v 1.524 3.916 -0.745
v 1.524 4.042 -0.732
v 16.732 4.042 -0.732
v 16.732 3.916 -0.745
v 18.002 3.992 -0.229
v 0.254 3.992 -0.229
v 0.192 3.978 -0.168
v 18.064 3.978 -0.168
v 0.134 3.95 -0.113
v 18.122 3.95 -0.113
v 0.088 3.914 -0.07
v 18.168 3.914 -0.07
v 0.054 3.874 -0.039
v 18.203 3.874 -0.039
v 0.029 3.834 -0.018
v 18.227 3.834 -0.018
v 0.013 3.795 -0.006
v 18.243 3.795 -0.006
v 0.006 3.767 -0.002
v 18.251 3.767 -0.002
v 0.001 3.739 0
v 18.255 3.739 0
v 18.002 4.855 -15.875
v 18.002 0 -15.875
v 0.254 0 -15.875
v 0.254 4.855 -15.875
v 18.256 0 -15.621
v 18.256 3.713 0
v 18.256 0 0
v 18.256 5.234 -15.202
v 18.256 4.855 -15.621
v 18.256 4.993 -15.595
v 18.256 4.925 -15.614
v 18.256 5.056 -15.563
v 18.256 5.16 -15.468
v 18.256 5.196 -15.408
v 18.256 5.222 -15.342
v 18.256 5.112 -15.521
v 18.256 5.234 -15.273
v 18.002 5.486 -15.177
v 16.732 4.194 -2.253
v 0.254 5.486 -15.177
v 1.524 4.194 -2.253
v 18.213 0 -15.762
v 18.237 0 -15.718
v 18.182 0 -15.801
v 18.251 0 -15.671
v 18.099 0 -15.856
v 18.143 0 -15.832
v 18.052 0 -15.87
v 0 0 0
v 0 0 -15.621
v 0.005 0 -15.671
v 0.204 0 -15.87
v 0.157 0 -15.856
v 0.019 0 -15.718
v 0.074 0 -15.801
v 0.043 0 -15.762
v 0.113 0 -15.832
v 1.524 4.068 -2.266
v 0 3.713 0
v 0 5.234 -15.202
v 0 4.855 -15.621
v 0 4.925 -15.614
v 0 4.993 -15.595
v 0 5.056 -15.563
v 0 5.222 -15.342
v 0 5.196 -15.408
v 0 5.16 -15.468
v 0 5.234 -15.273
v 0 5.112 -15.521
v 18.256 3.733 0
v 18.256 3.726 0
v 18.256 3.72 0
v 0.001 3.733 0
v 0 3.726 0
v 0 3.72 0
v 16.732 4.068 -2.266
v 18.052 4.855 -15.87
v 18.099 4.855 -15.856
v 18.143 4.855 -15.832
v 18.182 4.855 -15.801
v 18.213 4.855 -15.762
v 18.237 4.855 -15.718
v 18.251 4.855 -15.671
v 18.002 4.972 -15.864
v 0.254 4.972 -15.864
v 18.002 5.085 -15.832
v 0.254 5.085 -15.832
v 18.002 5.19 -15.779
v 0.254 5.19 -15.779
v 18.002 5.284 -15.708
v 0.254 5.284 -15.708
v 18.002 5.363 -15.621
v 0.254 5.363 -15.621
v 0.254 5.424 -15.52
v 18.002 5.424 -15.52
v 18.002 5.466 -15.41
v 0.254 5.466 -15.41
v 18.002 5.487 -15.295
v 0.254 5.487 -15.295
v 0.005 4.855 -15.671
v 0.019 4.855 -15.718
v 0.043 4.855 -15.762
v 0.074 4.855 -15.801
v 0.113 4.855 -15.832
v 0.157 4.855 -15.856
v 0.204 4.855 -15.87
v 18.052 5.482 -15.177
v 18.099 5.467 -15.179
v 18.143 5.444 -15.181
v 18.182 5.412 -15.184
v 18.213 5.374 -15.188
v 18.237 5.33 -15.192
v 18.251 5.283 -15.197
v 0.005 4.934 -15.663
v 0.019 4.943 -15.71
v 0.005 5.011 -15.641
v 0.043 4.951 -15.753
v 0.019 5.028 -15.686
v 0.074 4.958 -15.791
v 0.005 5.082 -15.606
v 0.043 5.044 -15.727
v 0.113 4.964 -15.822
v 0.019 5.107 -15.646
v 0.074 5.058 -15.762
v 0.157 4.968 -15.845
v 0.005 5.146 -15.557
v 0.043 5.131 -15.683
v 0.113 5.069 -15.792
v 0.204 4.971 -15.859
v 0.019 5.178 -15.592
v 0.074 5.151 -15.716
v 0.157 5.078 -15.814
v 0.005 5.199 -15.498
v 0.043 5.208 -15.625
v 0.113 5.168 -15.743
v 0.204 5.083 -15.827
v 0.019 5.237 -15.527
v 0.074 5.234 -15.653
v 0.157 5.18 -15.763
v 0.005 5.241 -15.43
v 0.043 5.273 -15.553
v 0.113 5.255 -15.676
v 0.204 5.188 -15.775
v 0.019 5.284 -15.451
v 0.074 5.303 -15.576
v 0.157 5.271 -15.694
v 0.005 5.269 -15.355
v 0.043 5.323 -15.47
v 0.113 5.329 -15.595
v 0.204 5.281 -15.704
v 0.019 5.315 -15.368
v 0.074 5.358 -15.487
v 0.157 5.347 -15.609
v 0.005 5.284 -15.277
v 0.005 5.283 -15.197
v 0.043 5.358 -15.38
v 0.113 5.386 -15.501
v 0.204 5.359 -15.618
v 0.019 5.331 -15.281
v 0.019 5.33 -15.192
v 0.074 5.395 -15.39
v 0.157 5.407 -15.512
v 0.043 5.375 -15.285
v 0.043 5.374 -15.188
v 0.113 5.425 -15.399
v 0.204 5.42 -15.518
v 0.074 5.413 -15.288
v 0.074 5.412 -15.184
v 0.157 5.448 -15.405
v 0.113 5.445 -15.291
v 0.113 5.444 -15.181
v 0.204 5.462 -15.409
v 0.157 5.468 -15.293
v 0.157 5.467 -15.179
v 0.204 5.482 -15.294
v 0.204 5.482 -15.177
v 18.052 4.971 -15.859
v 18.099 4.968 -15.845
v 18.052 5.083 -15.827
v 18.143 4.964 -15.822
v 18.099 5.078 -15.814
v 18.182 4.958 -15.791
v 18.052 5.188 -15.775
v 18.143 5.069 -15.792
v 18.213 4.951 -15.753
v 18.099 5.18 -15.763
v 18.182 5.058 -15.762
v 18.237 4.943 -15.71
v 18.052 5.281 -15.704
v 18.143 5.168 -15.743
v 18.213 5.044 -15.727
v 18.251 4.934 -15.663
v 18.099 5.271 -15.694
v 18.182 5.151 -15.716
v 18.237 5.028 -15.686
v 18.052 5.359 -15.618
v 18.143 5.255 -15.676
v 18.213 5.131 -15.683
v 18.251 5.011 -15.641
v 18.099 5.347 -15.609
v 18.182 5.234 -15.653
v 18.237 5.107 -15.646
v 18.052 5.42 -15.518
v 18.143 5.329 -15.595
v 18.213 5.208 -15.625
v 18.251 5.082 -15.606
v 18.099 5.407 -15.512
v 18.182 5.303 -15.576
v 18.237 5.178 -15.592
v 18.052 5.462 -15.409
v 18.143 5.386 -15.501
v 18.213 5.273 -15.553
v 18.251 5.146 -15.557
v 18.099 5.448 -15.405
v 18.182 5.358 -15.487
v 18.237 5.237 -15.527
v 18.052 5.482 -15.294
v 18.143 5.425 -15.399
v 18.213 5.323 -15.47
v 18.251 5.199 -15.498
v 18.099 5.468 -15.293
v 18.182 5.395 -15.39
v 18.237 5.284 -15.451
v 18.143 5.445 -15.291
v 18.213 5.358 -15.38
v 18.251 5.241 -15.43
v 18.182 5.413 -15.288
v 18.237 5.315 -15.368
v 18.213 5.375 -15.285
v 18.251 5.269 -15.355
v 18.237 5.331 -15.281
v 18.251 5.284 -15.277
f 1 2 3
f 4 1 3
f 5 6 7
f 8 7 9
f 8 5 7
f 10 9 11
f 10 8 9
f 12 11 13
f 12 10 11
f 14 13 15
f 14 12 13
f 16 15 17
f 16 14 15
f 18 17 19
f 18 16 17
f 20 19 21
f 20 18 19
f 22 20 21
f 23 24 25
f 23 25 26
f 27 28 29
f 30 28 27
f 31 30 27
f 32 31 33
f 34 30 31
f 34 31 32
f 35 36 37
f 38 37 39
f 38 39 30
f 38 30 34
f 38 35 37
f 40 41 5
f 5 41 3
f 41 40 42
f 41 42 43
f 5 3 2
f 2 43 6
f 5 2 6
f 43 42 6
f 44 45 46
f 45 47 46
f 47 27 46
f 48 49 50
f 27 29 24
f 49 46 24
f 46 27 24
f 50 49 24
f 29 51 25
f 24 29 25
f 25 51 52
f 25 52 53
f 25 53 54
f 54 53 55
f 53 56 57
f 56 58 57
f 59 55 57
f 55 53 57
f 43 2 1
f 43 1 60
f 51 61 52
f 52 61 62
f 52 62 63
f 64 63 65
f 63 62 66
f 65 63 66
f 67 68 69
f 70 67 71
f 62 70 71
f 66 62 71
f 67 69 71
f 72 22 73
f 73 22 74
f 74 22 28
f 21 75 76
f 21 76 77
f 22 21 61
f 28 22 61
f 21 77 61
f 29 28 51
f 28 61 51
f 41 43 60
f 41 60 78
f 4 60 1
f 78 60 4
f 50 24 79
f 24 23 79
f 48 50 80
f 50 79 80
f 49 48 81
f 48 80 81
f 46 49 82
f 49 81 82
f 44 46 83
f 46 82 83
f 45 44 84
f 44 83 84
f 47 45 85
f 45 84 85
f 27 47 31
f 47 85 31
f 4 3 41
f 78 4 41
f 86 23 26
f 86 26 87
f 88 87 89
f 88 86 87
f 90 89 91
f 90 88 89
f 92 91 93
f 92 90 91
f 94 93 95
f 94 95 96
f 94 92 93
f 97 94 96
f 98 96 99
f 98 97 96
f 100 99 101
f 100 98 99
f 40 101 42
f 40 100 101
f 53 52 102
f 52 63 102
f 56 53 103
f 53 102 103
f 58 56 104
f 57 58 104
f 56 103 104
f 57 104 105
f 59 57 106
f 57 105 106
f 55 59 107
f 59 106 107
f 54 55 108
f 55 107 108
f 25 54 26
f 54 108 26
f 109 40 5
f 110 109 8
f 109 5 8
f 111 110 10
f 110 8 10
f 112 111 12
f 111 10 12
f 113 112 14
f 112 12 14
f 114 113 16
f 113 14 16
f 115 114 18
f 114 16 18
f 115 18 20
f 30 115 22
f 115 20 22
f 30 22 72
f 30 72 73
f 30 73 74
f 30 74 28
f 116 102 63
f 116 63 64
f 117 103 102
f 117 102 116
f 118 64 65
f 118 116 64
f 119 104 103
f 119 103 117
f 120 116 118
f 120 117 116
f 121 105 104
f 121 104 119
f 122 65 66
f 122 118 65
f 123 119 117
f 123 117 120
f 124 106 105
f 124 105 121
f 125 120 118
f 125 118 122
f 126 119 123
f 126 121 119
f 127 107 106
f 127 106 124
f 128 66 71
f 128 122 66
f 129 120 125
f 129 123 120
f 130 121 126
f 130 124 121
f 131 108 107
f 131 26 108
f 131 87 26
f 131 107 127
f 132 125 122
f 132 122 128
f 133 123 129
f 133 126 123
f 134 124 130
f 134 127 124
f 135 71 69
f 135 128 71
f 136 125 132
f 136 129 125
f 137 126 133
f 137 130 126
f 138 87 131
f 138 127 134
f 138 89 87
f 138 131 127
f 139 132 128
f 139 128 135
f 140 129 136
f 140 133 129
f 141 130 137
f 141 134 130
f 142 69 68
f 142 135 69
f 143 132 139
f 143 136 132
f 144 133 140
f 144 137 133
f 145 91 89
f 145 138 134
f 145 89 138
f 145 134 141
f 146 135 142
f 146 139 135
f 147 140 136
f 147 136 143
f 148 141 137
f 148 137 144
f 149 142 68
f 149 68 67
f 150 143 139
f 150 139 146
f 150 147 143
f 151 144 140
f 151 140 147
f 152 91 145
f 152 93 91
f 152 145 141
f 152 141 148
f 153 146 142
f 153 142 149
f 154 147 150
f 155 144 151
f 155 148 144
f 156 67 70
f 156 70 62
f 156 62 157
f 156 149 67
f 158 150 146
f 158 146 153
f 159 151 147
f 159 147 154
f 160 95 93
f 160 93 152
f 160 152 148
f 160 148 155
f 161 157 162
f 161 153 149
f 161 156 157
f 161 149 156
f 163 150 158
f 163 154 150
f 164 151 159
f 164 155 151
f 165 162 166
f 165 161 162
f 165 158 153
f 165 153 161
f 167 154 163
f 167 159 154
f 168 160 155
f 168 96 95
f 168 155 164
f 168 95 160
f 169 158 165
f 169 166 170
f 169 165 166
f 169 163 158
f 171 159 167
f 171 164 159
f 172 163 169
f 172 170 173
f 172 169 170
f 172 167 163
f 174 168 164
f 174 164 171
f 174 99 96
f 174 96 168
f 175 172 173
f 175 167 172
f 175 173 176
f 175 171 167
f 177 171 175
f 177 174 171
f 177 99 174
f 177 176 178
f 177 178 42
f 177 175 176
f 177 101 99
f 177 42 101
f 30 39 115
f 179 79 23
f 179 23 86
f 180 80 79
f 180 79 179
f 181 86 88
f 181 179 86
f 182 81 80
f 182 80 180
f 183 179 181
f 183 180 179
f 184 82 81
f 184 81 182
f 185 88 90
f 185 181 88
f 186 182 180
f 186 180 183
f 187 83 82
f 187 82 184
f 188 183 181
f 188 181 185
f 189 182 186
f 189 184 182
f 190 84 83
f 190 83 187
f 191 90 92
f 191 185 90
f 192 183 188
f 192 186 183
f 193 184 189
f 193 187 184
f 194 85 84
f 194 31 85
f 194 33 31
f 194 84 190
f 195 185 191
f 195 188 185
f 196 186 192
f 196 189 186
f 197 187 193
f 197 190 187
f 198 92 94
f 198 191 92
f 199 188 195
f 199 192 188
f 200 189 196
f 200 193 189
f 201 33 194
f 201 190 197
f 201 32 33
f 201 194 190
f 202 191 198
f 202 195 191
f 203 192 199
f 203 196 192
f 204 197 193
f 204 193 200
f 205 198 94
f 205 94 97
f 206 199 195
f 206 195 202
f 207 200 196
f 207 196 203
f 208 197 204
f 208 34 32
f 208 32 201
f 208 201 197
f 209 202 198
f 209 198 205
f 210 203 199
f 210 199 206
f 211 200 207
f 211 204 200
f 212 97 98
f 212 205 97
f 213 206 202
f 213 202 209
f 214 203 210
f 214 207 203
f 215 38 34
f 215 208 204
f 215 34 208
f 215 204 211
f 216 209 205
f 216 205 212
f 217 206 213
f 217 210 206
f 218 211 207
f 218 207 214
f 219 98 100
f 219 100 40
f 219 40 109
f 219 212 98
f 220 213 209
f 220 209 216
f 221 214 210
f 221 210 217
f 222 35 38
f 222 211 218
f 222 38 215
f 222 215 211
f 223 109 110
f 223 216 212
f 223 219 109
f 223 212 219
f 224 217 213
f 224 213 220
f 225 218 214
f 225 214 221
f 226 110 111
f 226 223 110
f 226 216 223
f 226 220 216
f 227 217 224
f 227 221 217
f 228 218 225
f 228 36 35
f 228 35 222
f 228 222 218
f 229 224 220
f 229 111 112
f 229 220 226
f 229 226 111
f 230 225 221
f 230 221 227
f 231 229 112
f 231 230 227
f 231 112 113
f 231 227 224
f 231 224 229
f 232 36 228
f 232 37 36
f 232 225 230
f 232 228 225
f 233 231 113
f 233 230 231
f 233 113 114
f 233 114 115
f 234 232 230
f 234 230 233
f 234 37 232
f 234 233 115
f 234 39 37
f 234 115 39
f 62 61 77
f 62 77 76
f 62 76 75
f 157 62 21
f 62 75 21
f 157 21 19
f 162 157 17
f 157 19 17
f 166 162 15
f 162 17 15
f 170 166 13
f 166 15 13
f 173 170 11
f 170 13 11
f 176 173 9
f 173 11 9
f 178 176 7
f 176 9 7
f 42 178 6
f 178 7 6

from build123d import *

# Parameters (mm, degrees)
BOSS_EXTRUDE1_DEPTH = 18.25625
FILLET1_R           = 0.635
FILLET2_R           = 0.254
SKETCH2_W           = 15.20825
SKETCH2_H           = 1.528516132
CUT_EXTRUDE1_DEPTH  = 0.127


with BuildPart() as part:
    # Sketch1 → Boss-Extrude1 (new body)
    with BuildSketch(Plane(origin=(0, 0, 0), x_dir=(0, 0, -1), z_dir=(1, 0, 0))):
        Polygon((0, 0), (15.875, 0), (15.875, 5.55625), (0, 3.96875), align=None)
    extrude(amount=BOSS_EXTRUDE1_DEPTH)

    # Fillet1
    fillet1_edges = [part.edges().sort_by_distance(p)[0] for p in [
        (9.128125, 5.55625, -15.875),
    ]]
    fillet(fillet1_edges, radius=FILLET1_R)

    # Fillet2
    fillet2_edges = [part.edges().sort_by_distance(p)[0] for p in [
        (18.25625, 2.427291449, -15.875),
        (0, 4.727590757, -7.588407569),
        (18.25625, 4.727590757, -7.588407569),
        (0, 5.325405257, -15.666088379),
        (18.25625, 5.325405257, -15.666088379),
        (0, 2.427291449, -15.875),
        (9.128125, 3.96875, 0),
    ]]
    fillet(fillet2_edges, radius=FILLET2_R)

    # Sketch2 → Cut-Extrude1 (cut)
    with BuildSketch(Plane(origin=(0, 3.929455446, 0.392945545), x_dir=(1, 0, 0), z_dir=(0, 0.99503719, 0.099503719))):
        with Locations((9.128125, 1.894772226)):
            Rectangle(SKETCH2_W, SKETCH2_H)
    extrude(amount=-CUT_EXTRUDE1_DEPTH, mode=Mode.SUBTRACT)


solid = part.part
